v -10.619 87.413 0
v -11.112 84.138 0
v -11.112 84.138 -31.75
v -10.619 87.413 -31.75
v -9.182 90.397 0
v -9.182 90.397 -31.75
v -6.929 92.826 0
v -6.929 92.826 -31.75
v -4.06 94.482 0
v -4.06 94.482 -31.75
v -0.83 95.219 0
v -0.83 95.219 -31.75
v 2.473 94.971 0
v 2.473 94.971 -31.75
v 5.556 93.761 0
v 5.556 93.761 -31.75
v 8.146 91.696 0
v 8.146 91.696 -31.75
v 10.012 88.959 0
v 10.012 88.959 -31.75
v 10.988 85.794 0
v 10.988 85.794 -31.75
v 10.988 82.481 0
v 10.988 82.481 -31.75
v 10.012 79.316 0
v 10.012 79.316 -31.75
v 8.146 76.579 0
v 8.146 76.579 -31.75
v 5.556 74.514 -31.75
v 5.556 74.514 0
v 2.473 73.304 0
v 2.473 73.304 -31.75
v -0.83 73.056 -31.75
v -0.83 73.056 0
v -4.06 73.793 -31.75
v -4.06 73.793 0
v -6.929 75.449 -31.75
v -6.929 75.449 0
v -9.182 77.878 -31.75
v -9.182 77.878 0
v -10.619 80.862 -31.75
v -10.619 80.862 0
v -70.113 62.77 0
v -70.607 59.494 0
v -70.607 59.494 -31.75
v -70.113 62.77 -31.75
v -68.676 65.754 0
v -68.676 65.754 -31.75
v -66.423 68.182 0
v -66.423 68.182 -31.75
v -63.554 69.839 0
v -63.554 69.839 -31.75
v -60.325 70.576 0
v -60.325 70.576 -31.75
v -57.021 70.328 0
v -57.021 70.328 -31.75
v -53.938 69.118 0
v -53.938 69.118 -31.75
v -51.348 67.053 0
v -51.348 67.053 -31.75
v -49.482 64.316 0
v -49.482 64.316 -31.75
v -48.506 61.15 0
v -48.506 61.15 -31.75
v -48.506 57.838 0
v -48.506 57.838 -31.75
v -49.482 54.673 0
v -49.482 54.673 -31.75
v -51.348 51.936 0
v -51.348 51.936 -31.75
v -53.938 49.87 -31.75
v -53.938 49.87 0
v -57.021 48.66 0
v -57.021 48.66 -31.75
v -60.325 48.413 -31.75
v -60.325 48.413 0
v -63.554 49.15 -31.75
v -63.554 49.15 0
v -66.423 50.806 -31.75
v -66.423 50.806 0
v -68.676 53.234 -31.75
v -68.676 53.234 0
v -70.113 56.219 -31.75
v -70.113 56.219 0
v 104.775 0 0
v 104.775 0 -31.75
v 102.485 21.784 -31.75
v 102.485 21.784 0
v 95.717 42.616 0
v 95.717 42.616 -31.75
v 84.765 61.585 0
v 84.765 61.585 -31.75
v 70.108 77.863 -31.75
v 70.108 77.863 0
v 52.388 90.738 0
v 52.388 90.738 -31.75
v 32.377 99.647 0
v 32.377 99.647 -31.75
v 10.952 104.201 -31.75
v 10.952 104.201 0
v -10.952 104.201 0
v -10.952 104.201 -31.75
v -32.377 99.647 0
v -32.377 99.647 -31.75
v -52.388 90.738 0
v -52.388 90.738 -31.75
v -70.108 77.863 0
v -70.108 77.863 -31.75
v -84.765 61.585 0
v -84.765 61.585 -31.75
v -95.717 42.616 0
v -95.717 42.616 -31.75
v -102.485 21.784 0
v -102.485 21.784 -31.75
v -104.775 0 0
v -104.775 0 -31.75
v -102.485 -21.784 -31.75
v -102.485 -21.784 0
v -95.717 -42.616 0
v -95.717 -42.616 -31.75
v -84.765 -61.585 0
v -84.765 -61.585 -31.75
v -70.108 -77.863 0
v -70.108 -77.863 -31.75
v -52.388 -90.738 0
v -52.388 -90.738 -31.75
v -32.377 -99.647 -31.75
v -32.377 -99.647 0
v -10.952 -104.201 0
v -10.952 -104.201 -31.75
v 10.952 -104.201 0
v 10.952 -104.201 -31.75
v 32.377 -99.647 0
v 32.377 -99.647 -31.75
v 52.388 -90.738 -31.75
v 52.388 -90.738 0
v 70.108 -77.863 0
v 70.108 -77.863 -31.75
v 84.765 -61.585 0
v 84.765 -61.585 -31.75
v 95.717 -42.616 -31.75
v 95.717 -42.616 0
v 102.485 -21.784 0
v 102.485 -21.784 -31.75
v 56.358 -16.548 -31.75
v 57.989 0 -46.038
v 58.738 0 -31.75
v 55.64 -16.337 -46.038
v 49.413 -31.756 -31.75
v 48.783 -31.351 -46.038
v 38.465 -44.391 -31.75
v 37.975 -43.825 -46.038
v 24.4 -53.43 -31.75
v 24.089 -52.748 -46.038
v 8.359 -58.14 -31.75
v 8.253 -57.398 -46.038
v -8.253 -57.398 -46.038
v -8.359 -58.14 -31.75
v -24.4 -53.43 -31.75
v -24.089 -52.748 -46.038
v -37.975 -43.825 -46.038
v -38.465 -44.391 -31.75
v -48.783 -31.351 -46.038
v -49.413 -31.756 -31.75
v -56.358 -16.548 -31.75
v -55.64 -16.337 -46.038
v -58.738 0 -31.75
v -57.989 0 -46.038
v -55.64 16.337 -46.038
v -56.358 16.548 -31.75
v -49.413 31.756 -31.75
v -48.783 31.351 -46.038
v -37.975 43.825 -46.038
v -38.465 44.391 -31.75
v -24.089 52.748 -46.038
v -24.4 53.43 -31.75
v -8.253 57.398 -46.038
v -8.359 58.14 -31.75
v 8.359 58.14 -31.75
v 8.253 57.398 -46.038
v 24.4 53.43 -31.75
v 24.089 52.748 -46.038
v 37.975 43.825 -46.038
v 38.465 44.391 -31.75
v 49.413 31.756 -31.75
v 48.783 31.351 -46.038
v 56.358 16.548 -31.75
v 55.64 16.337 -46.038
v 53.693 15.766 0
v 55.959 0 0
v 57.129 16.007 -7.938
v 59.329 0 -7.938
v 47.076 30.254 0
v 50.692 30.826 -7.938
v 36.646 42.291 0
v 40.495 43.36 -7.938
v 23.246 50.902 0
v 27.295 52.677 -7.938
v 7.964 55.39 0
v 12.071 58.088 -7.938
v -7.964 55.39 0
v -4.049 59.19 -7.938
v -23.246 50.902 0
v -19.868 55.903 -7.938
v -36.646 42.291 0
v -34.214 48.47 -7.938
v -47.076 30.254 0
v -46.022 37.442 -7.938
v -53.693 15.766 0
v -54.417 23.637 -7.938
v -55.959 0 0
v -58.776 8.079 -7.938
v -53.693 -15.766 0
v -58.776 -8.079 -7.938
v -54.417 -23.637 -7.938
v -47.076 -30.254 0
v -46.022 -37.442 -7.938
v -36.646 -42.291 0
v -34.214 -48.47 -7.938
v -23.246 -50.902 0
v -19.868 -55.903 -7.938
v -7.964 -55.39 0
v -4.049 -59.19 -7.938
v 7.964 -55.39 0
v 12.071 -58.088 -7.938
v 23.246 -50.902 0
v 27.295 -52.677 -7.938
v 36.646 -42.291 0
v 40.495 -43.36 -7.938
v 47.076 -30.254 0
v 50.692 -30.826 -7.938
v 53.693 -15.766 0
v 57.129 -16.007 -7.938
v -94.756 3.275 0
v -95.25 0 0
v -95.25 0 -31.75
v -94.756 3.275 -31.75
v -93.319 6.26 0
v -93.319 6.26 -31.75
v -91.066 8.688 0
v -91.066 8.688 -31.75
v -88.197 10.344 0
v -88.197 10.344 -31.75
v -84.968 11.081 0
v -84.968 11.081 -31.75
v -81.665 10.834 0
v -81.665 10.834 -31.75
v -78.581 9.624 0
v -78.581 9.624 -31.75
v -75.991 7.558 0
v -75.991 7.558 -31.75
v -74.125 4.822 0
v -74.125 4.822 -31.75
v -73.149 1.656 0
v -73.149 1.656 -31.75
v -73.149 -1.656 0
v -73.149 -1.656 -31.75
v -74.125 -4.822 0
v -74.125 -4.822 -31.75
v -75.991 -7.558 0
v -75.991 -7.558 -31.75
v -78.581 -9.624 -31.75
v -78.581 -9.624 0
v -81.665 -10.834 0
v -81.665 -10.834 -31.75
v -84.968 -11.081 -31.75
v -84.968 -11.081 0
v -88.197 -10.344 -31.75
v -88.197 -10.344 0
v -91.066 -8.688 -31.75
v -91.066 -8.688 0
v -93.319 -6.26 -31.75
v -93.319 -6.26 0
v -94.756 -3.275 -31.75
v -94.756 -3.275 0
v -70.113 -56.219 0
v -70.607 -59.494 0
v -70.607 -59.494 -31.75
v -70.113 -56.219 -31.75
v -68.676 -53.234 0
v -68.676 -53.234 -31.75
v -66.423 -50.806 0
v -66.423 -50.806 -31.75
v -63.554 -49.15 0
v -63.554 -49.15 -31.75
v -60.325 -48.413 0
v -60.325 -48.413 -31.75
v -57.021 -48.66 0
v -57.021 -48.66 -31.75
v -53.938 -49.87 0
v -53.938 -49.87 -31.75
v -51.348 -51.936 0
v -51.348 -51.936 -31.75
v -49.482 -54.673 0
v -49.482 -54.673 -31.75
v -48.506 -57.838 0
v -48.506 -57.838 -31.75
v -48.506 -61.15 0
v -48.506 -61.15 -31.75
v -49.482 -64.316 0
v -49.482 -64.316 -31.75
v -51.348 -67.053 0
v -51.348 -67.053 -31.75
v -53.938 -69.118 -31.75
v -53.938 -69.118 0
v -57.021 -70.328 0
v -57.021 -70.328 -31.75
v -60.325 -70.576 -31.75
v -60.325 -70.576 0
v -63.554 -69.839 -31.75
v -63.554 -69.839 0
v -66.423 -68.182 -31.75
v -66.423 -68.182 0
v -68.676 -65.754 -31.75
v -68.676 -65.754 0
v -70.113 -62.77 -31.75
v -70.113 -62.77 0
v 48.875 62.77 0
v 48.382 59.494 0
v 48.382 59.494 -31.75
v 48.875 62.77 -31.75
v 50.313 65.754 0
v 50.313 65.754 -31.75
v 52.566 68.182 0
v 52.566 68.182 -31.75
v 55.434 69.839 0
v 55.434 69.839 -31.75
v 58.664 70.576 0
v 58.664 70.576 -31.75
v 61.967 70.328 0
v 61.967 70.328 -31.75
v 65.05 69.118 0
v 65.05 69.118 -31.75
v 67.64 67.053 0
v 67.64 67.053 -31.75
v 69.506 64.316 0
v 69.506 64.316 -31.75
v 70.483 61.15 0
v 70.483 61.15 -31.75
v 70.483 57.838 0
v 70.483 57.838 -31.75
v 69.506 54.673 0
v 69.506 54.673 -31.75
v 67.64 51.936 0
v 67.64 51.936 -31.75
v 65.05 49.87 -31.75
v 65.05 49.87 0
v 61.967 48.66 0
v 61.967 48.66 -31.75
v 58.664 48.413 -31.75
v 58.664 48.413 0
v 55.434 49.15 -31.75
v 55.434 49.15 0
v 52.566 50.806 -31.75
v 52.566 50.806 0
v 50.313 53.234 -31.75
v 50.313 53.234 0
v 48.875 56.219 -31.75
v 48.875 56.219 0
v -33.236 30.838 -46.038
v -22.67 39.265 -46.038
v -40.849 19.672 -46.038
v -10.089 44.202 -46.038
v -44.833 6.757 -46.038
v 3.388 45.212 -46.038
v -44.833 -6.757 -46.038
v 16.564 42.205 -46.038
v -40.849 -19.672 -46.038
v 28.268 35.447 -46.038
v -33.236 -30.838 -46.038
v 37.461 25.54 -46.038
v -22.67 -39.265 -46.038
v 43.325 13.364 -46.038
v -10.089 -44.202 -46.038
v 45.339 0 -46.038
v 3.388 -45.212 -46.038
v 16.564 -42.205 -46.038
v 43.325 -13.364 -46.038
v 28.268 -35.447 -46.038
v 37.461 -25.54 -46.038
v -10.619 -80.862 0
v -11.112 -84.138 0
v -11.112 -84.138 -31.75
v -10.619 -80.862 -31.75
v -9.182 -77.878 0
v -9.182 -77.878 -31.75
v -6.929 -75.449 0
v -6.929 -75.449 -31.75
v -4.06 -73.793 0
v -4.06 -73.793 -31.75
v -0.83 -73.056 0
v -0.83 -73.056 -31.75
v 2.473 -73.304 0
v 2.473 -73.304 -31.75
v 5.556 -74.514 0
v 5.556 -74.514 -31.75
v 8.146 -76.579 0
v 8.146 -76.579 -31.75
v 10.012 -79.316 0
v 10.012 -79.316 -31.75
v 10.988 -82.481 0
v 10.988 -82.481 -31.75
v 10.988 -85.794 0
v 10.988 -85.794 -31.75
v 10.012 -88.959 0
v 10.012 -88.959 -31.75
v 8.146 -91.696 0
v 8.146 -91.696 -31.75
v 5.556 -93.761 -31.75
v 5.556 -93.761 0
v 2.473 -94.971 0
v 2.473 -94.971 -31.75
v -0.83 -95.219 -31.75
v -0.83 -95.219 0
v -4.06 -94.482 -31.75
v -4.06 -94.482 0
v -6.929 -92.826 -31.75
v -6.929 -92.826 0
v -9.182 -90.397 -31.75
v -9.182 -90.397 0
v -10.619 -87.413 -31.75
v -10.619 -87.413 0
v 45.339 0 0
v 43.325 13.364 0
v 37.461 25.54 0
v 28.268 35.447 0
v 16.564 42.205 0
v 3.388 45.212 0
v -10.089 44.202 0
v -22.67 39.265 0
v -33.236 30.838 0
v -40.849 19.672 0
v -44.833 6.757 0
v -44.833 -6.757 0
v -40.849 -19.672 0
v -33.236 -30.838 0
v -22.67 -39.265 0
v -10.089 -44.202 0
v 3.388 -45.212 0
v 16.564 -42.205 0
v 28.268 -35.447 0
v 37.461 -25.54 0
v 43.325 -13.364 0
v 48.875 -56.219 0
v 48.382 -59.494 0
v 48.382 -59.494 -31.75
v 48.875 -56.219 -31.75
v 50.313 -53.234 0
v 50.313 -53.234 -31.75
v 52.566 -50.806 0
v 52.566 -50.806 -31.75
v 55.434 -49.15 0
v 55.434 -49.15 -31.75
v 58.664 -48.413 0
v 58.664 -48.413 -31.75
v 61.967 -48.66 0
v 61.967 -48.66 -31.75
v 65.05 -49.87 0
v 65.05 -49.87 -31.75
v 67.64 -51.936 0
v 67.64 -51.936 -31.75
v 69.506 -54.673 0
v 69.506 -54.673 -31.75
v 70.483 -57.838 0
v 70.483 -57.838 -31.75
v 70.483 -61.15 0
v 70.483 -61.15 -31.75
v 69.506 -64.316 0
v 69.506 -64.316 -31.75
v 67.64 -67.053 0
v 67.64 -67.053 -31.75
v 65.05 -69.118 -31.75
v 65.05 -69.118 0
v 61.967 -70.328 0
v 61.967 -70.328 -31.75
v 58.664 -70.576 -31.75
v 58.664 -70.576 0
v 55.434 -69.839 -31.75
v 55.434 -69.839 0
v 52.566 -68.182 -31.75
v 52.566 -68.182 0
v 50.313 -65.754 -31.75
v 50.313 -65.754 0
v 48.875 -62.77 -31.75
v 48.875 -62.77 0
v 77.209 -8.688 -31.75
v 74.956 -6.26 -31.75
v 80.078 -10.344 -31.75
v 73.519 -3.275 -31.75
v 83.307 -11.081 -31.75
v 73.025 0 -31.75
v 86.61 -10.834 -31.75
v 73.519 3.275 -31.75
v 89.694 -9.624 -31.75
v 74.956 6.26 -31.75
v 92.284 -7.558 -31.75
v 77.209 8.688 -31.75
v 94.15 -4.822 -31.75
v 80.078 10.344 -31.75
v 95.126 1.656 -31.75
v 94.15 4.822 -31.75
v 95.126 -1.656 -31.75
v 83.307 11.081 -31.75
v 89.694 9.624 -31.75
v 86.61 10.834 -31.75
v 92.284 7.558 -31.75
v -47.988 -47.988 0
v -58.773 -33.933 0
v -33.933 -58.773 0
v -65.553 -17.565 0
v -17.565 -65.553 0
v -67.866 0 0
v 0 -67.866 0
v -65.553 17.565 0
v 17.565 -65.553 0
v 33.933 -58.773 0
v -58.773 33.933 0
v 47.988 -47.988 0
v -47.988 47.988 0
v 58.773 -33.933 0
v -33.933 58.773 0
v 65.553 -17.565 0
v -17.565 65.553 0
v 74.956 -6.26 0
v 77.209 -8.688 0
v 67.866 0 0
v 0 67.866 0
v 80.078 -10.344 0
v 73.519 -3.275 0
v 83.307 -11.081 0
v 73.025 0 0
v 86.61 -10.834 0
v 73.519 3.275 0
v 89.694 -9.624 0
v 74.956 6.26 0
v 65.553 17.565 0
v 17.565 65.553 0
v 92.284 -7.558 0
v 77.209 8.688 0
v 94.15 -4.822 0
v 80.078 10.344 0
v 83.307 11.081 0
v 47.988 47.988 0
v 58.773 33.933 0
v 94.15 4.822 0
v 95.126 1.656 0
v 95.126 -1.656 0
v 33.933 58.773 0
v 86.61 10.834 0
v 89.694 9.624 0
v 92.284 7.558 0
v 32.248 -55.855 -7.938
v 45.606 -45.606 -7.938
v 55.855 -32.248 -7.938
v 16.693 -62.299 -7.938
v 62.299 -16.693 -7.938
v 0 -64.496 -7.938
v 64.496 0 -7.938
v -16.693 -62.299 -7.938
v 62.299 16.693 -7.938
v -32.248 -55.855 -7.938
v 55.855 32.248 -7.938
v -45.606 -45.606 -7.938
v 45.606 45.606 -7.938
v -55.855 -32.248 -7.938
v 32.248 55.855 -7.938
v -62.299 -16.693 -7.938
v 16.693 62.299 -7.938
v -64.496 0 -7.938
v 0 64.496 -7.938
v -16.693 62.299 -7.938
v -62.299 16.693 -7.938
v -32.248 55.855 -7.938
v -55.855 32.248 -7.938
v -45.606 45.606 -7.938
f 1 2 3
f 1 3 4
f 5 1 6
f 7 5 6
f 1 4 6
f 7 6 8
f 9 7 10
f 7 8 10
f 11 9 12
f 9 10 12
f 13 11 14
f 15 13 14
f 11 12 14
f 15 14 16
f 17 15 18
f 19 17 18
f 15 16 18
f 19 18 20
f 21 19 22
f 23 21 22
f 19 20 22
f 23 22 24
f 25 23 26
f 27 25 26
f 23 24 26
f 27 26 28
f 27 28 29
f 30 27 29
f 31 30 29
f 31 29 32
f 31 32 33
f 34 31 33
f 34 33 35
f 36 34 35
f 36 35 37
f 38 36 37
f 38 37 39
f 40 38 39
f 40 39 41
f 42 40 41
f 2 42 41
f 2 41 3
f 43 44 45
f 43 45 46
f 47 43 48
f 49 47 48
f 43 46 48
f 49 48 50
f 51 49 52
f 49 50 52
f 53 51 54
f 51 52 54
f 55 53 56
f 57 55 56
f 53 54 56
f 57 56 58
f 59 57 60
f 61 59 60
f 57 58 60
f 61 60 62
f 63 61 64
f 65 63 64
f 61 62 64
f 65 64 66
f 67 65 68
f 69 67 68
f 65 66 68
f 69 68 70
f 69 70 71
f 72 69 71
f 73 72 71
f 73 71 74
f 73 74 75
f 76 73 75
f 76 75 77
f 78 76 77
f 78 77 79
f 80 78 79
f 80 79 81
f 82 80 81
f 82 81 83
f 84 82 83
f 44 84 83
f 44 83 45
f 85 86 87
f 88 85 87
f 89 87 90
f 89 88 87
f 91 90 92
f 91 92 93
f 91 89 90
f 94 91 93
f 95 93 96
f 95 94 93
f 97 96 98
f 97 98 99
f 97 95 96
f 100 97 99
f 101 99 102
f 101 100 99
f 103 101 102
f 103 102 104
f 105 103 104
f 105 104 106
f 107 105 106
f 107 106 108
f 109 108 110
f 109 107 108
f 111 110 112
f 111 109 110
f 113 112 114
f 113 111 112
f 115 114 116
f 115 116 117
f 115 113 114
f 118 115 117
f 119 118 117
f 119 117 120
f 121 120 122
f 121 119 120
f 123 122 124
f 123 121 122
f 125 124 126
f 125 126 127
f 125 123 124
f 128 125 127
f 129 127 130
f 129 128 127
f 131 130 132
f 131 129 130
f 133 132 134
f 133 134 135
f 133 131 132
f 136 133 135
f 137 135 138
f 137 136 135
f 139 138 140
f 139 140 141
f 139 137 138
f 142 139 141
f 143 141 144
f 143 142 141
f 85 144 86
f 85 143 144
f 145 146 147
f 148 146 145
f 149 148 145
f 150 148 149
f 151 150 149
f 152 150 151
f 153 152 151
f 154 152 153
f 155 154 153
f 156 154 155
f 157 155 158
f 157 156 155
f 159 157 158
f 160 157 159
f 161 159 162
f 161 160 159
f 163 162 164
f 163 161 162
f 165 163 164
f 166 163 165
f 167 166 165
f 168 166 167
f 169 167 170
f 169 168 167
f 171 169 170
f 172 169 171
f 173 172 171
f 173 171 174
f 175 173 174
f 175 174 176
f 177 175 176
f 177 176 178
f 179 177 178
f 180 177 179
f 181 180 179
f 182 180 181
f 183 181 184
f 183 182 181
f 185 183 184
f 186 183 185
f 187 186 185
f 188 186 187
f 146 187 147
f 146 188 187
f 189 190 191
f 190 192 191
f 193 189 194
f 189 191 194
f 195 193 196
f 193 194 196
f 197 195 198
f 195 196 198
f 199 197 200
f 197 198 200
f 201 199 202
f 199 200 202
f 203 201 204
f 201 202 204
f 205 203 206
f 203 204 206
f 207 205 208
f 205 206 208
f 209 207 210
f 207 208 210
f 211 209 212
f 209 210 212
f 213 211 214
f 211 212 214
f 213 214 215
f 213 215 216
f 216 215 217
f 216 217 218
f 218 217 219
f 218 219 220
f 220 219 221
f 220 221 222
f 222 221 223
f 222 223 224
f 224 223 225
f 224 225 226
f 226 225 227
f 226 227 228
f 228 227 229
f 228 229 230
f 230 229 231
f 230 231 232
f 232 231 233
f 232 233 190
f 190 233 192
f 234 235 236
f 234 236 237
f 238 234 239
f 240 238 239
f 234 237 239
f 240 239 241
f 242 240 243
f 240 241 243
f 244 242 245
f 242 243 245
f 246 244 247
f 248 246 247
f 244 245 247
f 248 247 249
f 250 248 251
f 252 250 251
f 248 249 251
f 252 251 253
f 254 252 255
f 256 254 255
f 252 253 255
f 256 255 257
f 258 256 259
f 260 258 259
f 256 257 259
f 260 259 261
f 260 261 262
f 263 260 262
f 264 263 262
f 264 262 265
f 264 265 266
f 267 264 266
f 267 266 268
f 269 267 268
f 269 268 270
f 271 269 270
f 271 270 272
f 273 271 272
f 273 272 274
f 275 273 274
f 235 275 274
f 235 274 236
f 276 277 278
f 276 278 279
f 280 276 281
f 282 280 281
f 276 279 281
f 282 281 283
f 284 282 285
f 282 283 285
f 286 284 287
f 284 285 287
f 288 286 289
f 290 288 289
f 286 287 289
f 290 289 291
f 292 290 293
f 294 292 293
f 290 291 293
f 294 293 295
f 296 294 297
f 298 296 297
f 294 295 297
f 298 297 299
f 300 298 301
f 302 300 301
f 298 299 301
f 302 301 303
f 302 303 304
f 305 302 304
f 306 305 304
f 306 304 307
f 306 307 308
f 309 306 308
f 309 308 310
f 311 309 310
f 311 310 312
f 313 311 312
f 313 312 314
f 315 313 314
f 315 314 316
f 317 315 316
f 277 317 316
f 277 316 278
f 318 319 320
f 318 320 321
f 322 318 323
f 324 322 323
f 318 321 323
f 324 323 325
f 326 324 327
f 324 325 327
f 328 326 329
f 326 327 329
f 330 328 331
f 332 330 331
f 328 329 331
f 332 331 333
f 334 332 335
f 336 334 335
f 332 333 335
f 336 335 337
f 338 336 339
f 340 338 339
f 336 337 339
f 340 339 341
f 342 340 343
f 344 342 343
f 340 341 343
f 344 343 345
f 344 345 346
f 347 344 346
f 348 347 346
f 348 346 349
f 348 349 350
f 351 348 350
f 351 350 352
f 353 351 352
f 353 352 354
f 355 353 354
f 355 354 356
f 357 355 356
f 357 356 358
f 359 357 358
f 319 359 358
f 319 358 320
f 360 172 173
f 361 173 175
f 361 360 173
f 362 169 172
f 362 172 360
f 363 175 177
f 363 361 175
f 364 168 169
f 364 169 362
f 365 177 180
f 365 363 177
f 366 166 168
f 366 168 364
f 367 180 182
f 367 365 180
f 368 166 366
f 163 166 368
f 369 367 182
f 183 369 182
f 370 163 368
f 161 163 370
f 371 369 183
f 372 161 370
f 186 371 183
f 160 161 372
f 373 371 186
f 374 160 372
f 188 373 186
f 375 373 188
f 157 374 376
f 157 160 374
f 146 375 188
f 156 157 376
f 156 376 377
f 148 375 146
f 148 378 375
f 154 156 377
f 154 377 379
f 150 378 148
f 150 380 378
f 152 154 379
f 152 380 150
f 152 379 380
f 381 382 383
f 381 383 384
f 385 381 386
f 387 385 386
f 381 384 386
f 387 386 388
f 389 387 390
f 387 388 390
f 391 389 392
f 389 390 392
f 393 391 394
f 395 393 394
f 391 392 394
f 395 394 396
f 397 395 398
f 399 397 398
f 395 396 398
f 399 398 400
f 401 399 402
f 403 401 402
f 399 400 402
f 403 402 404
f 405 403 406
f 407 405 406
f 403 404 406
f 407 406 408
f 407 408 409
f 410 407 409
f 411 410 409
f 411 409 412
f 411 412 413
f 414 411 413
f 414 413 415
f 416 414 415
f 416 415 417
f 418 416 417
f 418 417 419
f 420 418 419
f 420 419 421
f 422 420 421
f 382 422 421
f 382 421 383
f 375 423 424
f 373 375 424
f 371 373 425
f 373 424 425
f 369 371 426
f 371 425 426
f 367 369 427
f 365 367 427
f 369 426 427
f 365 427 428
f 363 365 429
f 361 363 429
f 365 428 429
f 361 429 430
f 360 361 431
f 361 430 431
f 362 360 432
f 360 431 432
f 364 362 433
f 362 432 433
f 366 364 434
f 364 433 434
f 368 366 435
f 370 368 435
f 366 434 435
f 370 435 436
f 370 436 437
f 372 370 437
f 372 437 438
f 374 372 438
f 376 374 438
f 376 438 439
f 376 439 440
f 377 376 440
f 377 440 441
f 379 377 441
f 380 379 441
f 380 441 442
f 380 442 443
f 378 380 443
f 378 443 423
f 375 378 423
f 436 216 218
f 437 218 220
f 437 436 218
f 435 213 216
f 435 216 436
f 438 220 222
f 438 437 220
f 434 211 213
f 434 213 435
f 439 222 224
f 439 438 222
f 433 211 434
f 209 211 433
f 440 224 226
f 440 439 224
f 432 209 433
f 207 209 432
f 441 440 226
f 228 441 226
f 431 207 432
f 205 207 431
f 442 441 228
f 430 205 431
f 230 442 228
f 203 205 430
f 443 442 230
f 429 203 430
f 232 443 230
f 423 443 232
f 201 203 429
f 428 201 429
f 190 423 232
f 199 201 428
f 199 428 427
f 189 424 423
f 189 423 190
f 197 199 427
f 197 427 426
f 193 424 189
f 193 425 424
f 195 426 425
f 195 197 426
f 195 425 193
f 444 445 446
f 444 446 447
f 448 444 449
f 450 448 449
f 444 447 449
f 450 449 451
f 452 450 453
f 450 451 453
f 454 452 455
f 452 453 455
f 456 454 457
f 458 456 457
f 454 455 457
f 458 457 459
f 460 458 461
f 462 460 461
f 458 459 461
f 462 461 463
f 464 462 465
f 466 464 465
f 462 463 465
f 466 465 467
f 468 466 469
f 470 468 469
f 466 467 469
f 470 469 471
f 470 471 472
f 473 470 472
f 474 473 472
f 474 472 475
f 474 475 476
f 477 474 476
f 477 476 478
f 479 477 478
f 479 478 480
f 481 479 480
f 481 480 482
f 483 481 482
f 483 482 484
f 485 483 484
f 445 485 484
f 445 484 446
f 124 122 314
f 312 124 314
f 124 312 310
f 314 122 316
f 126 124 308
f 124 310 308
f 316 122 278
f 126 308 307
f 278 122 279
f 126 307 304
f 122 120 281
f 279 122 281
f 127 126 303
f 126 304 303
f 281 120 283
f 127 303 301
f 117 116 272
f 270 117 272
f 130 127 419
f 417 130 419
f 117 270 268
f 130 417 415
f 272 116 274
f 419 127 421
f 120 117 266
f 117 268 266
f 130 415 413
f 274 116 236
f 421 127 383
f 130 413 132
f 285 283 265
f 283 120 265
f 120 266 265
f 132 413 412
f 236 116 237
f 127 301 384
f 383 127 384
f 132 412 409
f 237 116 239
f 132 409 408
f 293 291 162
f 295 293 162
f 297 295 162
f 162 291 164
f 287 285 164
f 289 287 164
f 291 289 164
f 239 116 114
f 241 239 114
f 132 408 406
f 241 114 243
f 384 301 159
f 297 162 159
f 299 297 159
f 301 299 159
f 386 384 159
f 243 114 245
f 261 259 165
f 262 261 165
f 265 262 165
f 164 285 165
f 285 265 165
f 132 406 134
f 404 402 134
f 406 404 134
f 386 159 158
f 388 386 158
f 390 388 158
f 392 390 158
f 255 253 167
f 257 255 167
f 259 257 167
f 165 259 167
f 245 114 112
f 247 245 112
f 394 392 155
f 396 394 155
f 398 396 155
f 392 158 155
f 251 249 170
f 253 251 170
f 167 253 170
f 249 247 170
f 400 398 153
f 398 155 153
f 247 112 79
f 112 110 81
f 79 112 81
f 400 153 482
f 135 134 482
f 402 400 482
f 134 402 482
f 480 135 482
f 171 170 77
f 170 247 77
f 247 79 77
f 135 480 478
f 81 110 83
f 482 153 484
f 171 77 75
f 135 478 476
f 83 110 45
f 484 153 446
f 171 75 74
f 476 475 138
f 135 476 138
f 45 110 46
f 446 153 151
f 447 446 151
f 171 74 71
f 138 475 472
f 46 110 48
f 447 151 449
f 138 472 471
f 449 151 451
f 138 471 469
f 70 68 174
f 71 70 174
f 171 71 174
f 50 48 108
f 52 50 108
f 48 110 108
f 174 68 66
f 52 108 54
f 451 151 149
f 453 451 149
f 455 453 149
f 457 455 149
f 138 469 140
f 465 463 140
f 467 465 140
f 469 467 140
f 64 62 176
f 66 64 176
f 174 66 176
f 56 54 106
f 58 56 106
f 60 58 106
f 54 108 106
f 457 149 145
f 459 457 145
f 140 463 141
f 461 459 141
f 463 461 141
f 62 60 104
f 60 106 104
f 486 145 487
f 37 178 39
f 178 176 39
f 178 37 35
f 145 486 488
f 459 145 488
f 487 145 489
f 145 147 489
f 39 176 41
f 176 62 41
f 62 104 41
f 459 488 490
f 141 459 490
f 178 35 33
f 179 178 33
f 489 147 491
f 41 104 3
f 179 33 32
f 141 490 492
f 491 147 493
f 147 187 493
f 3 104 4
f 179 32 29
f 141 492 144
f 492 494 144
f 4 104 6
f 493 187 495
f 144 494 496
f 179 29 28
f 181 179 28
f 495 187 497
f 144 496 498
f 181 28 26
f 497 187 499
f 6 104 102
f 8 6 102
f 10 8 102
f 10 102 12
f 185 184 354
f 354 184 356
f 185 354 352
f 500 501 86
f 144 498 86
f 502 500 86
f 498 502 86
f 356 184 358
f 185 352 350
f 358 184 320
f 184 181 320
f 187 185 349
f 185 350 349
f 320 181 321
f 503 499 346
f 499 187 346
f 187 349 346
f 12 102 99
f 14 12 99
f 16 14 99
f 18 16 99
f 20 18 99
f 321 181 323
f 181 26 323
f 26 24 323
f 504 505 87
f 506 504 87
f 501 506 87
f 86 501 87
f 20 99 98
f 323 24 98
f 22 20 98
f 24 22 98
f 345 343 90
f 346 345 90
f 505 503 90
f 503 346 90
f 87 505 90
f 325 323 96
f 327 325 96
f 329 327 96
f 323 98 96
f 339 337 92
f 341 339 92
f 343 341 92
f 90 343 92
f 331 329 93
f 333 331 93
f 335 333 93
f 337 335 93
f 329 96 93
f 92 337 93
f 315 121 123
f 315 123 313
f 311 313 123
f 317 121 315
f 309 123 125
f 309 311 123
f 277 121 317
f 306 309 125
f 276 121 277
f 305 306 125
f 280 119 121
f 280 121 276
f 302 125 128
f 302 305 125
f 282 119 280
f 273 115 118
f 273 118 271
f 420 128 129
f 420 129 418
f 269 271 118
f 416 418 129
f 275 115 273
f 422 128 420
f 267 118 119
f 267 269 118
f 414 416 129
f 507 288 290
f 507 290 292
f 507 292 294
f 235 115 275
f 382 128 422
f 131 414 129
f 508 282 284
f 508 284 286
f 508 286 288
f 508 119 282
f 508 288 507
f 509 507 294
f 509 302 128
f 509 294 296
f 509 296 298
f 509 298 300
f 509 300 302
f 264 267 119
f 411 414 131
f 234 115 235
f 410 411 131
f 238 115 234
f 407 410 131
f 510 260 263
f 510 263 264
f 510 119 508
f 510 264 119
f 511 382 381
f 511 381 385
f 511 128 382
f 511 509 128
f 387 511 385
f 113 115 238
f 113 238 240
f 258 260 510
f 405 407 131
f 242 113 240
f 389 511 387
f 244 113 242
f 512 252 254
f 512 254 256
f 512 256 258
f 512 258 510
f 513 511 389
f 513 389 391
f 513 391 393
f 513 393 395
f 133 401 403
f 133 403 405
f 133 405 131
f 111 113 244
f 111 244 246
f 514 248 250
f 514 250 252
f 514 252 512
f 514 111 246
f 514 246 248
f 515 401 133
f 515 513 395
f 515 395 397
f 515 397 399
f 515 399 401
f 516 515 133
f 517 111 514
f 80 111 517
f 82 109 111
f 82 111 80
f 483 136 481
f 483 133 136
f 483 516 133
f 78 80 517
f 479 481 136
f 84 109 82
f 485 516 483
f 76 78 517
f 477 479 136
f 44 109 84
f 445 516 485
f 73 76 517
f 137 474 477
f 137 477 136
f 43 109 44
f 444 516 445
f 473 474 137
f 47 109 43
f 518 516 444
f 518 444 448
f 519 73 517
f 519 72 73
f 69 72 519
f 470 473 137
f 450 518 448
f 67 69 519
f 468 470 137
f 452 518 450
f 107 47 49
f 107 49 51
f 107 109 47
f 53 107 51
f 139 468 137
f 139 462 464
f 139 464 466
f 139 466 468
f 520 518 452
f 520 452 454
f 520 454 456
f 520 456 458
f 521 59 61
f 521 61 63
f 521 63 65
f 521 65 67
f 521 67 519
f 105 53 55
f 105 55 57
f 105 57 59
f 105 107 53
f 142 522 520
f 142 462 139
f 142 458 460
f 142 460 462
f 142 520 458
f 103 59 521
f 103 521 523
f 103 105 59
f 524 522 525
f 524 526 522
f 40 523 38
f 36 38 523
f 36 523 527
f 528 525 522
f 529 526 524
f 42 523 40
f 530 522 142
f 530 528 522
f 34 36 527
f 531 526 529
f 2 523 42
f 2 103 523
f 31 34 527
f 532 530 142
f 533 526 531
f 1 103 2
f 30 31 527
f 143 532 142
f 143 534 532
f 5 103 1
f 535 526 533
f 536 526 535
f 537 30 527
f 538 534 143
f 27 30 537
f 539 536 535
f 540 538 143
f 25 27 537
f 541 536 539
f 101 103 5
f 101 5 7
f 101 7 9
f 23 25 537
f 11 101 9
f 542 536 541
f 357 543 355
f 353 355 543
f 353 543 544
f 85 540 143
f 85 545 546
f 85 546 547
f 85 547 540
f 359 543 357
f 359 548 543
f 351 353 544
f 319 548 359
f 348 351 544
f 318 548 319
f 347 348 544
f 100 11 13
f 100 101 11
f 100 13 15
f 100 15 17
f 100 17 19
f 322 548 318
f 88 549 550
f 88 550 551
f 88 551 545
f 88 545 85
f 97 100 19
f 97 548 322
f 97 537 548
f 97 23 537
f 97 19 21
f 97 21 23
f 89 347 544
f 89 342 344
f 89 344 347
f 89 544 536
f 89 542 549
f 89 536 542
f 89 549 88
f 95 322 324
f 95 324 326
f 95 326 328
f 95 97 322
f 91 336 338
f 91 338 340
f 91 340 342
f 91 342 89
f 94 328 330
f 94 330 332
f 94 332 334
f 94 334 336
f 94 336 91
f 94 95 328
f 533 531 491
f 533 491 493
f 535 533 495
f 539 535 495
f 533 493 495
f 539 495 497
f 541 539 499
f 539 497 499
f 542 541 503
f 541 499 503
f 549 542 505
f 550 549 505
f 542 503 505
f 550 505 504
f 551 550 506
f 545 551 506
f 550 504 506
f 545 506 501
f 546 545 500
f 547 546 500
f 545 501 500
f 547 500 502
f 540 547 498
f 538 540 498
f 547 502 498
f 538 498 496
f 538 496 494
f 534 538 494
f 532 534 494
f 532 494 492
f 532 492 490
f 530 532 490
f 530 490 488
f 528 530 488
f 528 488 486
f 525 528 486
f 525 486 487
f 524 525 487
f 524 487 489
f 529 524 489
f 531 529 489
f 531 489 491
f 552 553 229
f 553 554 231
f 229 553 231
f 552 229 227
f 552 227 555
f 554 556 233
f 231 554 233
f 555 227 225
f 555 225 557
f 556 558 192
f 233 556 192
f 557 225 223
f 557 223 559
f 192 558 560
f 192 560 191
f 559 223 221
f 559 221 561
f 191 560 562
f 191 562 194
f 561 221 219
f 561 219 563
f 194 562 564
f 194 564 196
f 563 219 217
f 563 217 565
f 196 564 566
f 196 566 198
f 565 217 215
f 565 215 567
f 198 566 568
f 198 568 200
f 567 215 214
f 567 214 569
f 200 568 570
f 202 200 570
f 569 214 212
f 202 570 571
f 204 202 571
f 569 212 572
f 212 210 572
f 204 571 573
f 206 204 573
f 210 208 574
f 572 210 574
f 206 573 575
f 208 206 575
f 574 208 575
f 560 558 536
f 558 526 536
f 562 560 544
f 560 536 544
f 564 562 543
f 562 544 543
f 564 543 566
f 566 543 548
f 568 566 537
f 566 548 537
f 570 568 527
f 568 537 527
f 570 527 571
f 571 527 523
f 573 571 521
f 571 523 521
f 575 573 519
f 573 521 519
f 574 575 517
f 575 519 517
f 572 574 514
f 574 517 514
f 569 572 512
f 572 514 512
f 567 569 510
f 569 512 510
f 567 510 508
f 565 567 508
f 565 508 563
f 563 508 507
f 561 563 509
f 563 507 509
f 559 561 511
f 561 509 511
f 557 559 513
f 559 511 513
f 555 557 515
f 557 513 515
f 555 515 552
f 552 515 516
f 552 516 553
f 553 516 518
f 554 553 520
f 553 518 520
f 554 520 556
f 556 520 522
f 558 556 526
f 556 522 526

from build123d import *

# Parameters (mm, degrees)
F0_R     = 104.775
F1_DEPTH = 31.75
F2_R     = 58.7375
F3_DEPTH = 14.2875
F3_TAPER = 3
F4_R     = 45.339
F5_DEPTH = 46.0385001
F10_D    = 22.225


with BuildPart() as f1:
    # F0 (on Top) → F1 (new body)
    with BuildSketch(Plane.XY):
        Circle(F0_R)
    extrude(amount=-F1_DEPTH)

    # F2 (on face) → F3 (join)
    with BuildSketch(Plane(origin=(0, 0, -31.75), x_dir=(1, 0, 0), z_dir=(0, 0, -1))):
        Circle(F2_R)
    extrude(amount=F3_DEPTH, taper=F3_TAPER)

    # F4 (on face) → F5 (cut, through all)
    with BuildSketch(Plane.XY):
        Circle(F4_R)
    extrude(amount=-F5_DEPTH, mode=Mode.SUBTRACT)

    # F6 (on Front) → F8 (revolve, cut)
    with BuildSketch(Plane.XZ):
        Polygon((61.9125, -7.9375), (61.9125, 0), (55.959375, 0), (59.3286438537, -7.9375), align=None)
        Polygon((67.865625, 0), (61.9125, 0), (61.9125, -7.9375), (64.4963561463, -7.9375), align=None)
    revolve(axis=Axis((0, 0, 0), (0, 0, 1)), mode=Mode.SUBTRACT)

    # F10 (through all)
    with Locations(Plane.XY):
        with Locations((59.4941968021, 59.4941968021), (84.1375, 0), (59.4941968021, -59.4941968021), (0, -84.1375), (-59.4941968021, -59.4941968021), (-84.1375, 0), (-59.4941968021, 59.4941968021), (0, 84.1375)):
            Hole(F10_D / 2)


solid = f1.part
